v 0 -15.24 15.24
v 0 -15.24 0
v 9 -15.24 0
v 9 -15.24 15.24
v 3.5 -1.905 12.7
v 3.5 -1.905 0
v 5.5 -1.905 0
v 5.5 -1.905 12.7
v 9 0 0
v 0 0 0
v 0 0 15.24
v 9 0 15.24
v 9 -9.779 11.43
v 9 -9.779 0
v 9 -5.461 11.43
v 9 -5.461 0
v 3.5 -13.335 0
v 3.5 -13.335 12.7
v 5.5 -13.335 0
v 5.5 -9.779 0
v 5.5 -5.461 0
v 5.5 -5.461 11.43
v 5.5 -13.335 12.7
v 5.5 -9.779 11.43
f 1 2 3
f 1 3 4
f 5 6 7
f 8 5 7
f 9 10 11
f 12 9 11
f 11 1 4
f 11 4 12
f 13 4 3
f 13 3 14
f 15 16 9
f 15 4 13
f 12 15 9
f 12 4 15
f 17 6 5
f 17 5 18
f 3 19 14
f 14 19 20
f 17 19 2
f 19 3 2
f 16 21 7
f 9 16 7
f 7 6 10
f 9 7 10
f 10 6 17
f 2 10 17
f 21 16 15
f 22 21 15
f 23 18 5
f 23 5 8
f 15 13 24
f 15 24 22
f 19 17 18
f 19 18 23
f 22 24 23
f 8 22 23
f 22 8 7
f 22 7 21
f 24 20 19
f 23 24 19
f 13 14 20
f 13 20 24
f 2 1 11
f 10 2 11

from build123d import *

# Parameters (mm, degrees)
F0_W     = 15.24
F0_H     = 15.24
F1_DEPTH = 9
F2_W     = 2
F2_H     = 11.43
F3_DEPTH = 12.7
F4_W     = 4.318
F4_H     = 11.43
F5_DEPTH = 3.6


with BuildPart() as f1:
    # F0 (on Right) → F1 (new body)
    with BuildSketch(Plane.YZ):
        with Locations((-7.62, 7.62)):
            Rectangle(F0_W, F0_H)
    extrude(amount=F1_DEPTH)

    # F2 (on face) → F3 (cut)
    with BuildSketch(Plane(origin=(0, 0, 0), x_dir=(1, 0, 0), z_dir=(0, 0, -1))):
        with Locations((4.5, 7.62)):
            Rectangle(F2_W, F2_H)
    extrude(amount=-F3_DEPTH, mode=Mode.SUBTRACT)

    # F4 (on face) → F5 (cut)
    with BuildSketch(Plane.YZ.offset(9)):
        with Locations((-7.62, 5.715)):
            Rectangle(F4_W, F4_H)
    extrude(amount=-F5_DEPTH, mode=Mode.SUBTRACT)


solid = f1.part
